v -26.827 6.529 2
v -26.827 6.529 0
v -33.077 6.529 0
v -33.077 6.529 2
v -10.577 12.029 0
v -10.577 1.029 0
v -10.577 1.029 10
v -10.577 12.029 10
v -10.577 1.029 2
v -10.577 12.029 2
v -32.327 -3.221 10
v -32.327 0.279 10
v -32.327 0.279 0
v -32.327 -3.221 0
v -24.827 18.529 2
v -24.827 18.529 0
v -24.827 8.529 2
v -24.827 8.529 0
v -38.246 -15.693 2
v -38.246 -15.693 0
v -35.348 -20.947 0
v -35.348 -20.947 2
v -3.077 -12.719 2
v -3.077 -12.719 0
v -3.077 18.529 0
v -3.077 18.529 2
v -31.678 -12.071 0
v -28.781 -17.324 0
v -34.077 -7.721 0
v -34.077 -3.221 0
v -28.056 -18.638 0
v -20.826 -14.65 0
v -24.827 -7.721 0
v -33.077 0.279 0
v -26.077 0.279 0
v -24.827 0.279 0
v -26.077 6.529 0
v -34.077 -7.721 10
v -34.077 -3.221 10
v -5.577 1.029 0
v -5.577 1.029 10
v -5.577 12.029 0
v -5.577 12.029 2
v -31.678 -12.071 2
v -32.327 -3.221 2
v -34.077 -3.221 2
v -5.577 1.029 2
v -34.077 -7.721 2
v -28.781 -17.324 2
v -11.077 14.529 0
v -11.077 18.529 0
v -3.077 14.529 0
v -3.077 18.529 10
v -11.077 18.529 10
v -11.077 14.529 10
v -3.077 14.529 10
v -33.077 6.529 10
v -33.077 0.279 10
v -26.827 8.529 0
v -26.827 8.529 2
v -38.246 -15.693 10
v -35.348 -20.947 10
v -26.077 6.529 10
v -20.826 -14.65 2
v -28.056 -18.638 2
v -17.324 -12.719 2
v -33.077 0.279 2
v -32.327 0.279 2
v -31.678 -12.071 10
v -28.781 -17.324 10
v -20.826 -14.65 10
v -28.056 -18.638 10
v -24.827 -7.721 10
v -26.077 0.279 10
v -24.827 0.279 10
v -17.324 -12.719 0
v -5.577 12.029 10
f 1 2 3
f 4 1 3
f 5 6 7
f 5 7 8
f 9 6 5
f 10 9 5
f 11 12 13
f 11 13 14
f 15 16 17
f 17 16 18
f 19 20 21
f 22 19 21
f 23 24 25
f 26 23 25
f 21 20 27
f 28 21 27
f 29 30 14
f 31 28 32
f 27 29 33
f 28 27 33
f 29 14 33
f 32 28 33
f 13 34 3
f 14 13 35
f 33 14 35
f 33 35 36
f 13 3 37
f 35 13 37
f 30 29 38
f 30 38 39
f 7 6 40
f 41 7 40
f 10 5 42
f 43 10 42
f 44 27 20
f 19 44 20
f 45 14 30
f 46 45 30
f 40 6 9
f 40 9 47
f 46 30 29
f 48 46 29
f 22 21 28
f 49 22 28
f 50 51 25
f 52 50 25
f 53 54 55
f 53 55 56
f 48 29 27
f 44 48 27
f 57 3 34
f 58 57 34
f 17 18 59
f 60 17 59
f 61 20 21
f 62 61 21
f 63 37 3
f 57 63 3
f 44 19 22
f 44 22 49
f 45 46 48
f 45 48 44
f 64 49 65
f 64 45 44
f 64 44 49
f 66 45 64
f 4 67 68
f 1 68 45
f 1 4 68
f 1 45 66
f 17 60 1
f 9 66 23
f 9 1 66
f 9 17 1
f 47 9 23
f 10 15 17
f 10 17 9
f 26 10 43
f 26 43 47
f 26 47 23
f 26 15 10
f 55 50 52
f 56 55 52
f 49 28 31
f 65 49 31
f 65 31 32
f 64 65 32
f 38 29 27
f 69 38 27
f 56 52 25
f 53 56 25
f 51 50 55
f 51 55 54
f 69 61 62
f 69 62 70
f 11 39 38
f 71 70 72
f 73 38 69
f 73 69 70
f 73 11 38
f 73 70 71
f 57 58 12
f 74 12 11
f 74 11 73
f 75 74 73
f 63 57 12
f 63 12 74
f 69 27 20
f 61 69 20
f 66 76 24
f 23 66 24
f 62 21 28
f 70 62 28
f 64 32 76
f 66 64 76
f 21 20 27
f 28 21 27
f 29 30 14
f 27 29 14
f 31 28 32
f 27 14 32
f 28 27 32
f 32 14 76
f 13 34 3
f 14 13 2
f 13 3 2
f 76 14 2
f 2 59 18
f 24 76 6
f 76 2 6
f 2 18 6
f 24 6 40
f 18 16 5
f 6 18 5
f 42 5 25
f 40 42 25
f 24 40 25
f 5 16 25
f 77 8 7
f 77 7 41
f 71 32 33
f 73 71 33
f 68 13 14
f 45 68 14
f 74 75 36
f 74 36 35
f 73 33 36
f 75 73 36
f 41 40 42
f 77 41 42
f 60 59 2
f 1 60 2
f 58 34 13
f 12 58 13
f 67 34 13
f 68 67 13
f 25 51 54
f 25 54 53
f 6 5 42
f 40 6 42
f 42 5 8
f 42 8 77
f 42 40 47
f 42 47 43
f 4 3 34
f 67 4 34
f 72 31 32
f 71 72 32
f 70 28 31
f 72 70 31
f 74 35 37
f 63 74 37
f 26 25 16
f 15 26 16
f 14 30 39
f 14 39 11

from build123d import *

# Parameters (mm, degrees)
F0_W     = 1.75
F0_H     = 4.5
F0_W_2   = 8
F0_H_2   = 4
F0_W_3   = 5
F0_H_3   = 11
F1_DEPTH = 10
F2_W     = 5
F2_H     = 11
F2_W_2   = 8
F2_H_2   = 4
F3_DEPTH = 2


with BuildPart() as f1:
    # F0 (on Top) → F1 (new body)
    with BuildSketch(Plane.XY):
        Polygon((-26.07695, 6.529059), (-33.07695, 6.529059), (-33.07695, 0.279059), (-32.32695, 0.279059), (-26.07695, 0.279059), align=None)
        Polygon((-24.82695, 0.279059), (-26.07695, 0.279059), (-32.32695, 0.279059), (-32.32695, -3.220941), (-32.32695, -7.720941), (-24.82695, -7.720941), align=None)
        with Locations((-33.20195, -5.470941)):
            Rectangle(F0_W, F0_H)
        Polygon((-20.826182, -14.650474), (-24.82695, -7.720941), (-32.32695, -7.720941), (-34.07695, -7.720941), (-31.678288, -12.070558), (-28.780666, -17.324488), (-28.056261, -18.637971), align=None)
        Polygon((-28.780666, -17.324488), (-31.678288, -12.070558), (-38.245701, -15.692584), (-35.34808, -20.946515), align=None)
        with Locations((-7.07695, 16.529059)):
            Rectangle(F0_W_2, F0_H_2)
        with Locations((-8.07695, 6.529059)):
            Rectangle(F0_W_3, F0_H_3)
    extrude(amount=F1_DEPTH)


with BuildPart() as f3:
    # F2 (on Top) → F3 (new body)
    with BuildSketch(Plane.XY):
        Polygon((-38.245701, -15.692584), (-35.34808, -20.946515), (-28.780666, -17.324488), (-28.056261, -18.637971), (-20.826182, -14.650474), (-24.82695, -7.720941), (-24.82695, 0.279059), (-26.07695, 0.279059), (-26.07695, 6.529059), (-26.82695, 6.529059), (-26.917022, 6.529059), (-33.07695, 6.529059), (-33.07695, 0.279059), (-32.32695, 0.279059), (-32.32695, -3.220941), (-34.07695, -3.220941), (-34.07695, -7.720941), (-31.678288, -12.070558), align=None)
        Polygon((-24.82695, -7.720941), (-20.826182, -14.650474), (-17.323561, -12.718727), (-3.07695, -12.718727), (-3.07695, 14.529059), (-11.07695, 14.529059), (-11.07695, 18.529059), (-24.82695, 18.529059), (-24.82695, 8.529059), (-26.82695, 8.529059), (-26.82695, 6.529059), (-26.07695, 6.529059), (-26.07695, 0.279059), (-24.82695, 0.279059), align=None)
        with Locations((-8.07695, 6.529059)):
            Rectangle(F2_W, F2_H, mode=Mode.SUBTRACT)
        with Locations((-7.07695, 16.529059)):
            Rectangle(F2_W_2, F2_H_2)
    extrude(amount=F3_DEPTH)


solid = Compound([f1.part, f3.part])
